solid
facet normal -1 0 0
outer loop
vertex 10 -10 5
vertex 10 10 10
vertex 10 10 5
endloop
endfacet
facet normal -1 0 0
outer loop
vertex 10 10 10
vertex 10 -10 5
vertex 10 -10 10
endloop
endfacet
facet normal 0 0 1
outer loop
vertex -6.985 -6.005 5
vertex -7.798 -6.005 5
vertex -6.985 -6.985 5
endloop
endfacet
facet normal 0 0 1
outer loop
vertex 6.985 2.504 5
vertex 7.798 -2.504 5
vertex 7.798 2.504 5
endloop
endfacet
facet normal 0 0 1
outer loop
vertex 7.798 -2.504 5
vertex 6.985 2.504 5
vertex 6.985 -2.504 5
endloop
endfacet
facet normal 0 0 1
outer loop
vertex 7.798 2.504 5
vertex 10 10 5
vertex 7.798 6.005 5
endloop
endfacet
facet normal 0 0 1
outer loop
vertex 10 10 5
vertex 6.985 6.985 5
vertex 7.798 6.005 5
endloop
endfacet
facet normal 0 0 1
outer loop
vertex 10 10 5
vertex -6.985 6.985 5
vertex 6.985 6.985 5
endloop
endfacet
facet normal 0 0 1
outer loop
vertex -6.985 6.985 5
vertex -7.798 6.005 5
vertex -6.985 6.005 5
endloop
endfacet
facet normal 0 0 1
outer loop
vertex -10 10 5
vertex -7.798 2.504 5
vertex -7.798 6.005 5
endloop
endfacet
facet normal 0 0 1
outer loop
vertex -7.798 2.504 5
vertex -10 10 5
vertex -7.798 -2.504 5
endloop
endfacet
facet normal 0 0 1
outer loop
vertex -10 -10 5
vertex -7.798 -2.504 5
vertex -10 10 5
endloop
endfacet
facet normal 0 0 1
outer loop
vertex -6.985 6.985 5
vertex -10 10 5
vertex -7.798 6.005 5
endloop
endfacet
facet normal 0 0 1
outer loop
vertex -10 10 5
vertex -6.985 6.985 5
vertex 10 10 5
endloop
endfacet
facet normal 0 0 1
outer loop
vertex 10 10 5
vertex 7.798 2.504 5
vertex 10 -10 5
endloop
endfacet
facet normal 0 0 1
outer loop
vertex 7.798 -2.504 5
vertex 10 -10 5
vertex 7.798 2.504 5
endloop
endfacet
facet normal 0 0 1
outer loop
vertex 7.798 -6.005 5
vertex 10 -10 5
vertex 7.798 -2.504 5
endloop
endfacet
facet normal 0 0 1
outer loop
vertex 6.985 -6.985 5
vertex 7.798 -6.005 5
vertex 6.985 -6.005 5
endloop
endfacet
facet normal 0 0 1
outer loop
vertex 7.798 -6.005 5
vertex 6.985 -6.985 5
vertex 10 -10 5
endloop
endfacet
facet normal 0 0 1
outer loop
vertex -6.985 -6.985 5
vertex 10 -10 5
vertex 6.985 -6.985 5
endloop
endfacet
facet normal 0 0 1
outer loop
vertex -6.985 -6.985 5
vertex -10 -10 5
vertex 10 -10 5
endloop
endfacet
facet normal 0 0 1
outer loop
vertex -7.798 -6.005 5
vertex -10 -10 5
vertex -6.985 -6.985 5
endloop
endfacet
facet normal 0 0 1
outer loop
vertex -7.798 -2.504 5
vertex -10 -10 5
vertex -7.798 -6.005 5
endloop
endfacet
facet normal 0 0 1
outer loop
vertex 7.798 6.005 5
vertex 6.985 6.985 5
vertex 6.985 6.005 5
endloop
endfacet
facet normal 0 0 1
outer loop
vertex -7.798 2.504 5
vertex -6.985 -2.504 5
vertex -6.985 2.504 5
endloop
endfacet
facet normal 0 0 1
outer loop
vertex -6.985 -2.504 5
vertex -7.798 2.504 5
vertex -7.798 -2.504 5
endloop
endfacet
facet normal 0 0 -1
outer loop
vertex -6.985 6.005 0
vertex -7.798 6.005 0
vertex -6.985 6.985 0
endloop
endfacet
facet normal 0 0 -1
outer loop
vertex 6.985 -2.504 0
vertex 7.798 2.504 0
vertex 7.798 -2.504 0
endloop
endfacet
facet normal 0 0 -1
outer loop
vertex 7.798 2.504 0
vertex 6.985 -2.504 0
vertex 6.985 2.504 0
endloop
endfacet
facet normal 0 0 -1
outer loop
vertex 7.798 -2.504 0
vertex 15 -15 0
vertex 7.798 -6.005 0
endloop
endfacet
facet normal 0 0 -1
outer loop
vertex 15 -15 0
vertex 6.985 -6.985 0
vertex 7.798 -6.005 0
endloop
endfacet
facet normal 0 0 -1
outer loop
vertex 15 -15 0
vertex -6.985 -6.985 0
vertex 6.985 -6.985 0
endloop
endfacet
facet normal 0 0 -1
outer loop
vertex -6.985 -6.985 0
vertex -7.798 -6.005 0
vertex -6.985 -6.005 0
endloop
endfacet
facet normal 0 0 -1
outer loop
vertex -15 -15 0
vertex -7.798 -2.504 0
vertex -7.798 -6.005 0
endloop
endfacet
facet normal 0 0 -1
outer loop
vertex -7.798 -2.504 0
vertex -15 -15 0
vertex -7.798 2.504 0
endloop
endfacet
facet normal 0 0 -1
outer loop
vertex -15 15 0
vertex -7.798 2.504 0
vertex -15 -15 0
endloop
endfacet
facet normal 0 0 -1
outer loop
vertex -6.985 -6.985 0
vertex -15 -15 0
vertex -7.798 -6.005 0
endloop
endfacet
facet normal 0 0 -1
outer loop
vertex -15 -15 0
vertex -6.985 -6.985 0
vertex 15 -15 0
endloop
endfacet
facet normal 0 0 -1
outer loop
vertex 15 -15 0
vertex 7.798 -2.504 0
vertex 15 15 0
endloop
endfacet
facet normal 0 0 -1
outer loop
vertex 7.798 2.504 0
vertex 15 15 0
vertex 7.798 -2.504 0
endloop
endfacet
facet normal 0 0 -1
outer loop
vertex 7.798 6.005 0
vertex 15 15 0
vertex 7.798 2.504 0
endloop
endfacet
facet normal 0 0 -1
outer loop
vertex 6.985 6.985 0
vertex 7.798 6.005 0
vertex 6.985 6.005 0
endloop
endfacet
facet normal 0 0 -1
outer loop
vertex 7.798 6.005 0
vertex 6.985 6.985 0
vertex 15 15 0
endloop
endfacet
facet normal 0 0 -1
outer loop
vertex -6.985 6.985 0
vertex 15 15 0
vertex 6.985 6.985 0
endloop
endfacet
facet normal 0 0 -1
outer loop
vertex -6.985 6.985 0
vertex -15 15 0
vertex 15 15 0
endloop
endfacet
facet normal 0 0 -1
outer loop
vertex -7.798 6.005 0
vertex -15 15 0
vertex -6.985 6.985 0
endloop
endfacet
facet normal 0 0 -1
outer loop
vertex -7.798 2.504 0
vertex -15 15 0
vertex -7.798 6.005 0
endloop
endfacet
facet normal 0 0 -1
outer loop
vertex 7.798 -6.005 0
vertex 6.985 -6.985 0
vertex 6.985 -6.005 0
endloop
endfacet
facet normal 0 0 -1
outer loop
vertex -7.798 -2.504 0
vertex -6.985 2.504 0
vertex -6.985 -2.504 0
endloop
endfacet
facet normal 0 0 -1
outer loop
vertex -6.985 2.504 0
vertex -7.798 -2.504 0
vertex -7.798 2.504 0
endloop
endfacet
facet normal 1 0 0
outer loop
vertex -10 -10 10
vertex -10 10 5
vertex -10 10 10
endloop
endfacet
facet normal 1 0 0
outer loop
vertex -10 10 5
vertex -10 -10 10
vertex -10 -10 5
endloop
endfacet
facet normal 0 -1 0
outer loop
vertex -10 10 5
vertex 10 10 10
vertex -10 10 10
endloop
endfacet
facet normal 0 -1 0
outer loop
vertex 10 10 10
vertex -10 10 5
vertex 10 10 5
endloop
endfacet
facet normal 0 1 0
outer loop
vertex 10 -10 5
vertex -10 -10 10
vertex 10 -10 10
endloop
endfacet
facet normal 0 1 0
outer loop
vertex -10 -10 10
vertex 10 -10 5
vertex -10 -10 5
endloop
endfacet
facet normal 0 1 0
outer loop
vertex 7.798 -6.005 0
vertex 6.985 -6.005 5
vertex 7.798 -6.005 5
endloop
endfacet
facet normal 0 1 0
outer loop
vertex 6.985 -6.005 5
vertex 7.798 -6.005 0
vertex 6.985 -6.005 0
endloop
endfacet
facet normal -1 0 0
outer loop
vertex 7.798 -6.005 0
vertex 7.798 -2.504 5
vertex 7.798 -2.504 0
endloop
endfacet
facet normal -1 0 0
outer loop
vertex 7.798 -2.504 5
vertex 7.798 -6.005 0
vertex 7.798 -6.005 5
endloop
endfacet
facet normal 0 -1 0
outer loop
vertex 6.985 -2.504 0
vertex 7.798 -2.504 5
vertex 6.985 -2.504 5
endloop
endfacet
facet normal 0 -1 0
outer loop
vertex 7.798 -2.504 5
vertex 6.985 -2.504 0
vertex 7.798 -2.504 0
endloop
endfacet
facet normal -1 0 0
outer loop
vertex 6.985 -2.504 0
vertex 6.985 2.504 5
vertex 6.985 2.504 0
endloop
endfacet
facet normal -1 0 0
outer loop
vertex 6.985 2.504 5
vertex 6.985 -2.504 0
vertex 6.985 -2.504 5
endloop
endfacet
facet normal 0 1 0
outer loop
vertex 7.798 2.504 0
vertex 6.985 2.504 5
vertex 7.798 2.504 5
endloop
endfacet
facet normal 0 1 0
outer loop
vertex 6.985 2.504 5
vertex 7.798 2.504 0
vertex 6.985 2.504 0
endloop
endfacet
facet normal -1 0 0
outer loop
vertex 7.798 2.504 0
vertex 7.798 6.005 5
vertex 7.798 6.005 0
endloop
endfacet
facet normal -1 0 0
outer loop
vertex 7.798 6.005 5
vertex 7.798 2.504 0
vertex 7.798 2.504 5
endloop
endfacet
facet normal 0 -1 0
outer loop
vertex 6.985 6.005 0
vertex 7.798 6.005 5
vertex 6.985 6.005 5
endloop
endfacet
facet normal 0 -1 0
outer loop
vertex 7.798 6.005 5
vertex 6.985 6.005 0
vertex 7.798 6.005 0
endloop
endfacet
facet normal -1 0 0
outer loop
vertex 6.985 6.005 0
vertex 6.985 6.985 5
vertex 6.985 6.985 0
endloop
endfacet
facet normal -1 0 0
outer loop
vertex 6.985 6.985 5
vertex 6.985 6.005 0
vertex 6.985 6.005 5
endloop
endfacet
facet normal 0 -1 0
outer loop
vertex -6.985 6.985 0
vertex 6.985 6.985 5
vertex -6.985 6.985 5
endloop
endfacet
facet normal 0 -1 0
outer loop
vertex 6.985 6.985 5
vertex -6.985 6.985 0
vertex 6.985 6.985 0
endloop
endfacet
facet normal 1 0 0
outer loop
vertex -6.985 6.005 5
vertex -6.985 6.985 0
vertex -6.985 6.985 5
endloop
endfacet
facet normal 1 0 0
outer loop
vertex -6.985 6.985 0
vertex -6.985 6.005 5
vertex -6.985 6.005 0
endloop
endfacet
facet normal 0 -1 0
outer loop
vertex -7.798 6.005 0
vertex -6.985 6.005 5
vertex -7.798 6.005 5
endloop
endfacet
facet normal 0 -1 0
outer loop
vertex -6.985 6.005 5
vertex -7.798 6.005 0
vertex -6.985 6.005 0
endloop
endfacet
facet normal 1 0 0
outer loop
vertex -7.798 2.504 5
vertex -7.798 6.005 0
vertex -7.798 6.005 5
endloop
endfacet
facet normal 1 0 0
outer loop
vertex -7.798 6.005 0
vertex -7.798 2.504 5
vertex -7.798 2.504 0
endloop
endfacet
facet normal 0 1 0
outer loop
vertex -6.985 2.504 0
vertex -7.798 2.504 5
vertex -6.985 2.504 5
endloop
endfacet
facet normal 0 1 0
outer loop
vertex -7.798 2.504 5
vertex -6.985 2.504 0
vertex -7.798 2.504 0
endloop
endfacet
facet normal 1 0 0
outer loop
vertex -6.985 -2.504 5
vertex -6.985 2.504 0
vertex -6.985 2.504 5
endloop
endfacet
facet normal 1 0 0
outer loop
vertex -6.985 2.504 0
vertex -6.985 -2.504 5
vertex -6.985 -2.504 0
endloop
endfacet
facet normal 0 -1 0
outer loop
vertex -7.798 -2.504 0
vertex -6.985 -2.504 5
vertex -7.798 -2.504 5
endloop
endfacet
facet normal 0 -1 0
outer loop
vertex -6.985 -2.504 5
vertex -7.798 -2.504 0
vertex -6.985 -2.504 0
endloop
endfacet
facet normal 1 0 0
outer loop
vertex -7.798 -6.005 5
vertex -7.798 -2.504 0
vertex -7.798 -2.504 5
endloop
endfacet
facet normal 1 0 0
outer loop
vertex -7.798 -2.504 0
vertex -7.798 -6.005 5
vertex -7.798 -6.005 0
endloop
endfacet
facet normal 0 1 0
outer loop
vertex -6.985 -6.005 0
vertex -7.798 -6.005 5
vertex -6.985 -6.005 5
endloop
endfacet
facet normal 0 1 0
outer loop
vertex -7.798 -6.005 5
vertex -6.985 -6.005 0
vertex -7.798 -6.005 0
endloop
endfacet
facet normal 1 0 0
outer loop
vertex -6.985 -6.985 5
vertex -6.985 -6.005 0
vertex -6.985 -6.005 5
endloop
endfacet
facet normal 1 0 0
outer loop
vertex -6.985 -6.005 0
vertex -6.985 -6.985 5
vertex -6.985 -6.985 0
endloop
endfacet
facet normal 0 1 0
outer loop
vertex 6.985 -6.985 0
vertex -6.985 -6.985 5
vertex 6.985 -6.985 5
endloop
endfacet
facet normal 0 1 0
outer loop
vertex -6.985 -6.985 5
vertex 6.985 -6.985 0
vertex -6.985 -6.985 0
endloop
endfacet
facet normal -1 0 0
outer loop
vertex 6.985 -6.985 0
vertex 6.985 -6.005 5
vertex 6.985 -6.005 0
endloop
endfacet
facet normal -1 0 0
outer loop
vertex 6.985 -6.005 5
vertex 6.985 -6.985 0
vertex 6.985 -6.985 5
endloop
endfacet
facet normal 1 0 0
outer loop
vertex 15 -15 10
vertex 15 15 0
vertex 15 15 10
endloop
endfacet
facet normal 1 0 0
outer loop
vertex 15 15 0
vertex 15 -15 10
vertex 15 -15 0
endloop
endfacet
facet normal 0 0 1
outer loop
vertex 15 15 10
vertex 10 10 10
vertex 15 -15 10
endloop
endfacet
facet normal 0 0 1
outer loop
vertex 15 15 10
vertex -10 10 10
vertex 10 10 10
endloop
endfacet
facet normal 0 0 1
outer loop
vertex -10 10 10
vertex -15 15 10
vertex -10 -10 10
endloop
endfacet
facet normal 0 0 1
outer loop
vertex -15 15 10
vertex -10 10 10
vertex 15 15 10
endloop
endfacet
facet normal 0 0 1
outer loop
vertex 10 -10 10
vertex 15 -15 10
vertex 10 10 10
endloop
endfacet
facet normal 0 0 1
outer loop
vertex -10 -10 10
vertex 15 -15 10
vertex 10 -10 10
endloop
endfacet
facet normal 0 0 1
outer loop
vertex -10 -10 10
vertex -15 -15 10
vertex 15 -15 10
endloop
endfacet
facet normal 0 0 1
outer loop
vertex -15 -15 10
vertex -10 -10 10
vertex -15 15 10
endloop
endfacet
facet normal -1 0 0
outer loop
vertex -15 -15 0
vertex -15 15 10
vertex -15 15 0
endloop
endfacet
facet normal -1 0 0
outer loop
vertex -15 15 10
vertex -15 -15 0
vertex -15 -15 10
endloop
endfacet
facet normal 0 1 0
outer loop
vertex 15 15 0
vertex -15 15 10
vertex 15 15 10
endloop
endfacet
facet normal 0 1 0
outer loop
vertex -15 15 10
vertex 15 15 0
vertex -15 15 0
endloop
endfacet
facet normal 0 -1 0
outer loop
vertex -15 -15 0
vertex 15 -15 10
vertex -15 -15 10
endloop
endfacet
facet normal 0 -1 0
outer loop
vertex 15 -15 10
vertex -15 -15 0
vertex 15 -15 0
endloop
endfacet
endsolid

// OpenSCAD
// 1 unit = 1mm

// -*- mode: c -*-
/* All distances are in mm. */

$fn=2000;

module screw(trans, rot, length = screw_len, color = [1,1,0]) {        
    screw_diameter = 6;
    screw_len = 500;
    
    translate(trans)
    rotate(rot)
    color(color)
    cylinder(h = length, d = screw_diameter, center = true);
}


module switch_hole(position, height=20) {
  // https://github.com/technomancy/atreus/blob/master/case/openscad/atreus_case.scad
  /* Cherry MX switch hole with the center at `position`. Sizes come
      from the ErgoDox design. */
  hole_size    = 13.97;
  notch_width  = 3.5001;
  notch_offset = 4.2545;
  notch_depth  = 0.8128;

  // Convert from 2d to 3d
  linear_extrude(height=height, center=true) {
    square([hole_size, hole_size], center=true);

    translate([0, notch_offset]) {
      square([hole_size+2*notch_depth, notch_width], center=true);
    }
    translate([0, -notch_offset]) {
      square([hole_size+2*notch_depth, notch_width], center=true);
    }  
  }   
};

switch_cutout_width = 20;
switch_cutout_height = 5;
module switch_cutout(position) {
    w = switch_cutout_width;
    h = switch_cutout_height;
  translate(position) {
    difference() {
      cube([w, w, h], true);
      switch_hole([0], height = 200);
    }
  }
}

module switch_with_border(invert = false){
  module normal_switch() {
      switch_cutout([0,0,2.5]);
      difference() {
        translate([0,0,5]) {
          cube([30,30,10], true);
        }
        translate([0,0,5]){
          cube([20, 20, 10], true);
        }
      }  
  }
  
  if (!invert) {
    normal_switch();
  } else {
    
    normal_switch();
  }
  
}

offset = 0.5 * switch_cutout_width;
MAX_X = 2;
MAX_Y = 1;

// A blank side
module blank_plate(height_scalar=1){
  // NOTE: for screws, make them offset on each side.
  // E.g.:
  // Top side:    x0xxxx0x
  // Right side:  xx0xx0xx

  translate([-offset, -offset,0]){
    cube_w = (MAX_X + 2) * switch_cutout_width;
    cube([cube_w,cube_w, switch_cutout_height * height_scalar]);
  }
}

module key_layout() {

  // Flip it to make it easier to deal with
  {
    // Generate the keyslots
    for (x = [0:MAX_X]) {
        for (y = [0:MAX_Y]){
            // Draw the cutout
            new_x = x * switch_cutout_width + offset;
            new_y = y * switch_cutout_width + offset;
            switch_cutout([new_x,new_y,switch_cutout_height / 2]);
        }
    }

    // Create the border
    difference() {
      // This represents the border volume
      { 
        blank_plate(height_scalar=2);
      }

      // This represents the switches volume
      {
        cube_w = (MAX_X + 1) * switch_cutout_width;
        cube_d = 100;
        cube_h = (MAX_Y + 1) * switch_cutout_width;
        translate([0,0,-cube_d / 2]){
          cube([cube_w, cube_h, cube_d]);
        }
      }
    }  
  }
}

//key_layout();



module key() {
   // switch_cutout([new_x,new_y,switch_cutout_height / 2]);
    switch_with_border(true);
}

key();
